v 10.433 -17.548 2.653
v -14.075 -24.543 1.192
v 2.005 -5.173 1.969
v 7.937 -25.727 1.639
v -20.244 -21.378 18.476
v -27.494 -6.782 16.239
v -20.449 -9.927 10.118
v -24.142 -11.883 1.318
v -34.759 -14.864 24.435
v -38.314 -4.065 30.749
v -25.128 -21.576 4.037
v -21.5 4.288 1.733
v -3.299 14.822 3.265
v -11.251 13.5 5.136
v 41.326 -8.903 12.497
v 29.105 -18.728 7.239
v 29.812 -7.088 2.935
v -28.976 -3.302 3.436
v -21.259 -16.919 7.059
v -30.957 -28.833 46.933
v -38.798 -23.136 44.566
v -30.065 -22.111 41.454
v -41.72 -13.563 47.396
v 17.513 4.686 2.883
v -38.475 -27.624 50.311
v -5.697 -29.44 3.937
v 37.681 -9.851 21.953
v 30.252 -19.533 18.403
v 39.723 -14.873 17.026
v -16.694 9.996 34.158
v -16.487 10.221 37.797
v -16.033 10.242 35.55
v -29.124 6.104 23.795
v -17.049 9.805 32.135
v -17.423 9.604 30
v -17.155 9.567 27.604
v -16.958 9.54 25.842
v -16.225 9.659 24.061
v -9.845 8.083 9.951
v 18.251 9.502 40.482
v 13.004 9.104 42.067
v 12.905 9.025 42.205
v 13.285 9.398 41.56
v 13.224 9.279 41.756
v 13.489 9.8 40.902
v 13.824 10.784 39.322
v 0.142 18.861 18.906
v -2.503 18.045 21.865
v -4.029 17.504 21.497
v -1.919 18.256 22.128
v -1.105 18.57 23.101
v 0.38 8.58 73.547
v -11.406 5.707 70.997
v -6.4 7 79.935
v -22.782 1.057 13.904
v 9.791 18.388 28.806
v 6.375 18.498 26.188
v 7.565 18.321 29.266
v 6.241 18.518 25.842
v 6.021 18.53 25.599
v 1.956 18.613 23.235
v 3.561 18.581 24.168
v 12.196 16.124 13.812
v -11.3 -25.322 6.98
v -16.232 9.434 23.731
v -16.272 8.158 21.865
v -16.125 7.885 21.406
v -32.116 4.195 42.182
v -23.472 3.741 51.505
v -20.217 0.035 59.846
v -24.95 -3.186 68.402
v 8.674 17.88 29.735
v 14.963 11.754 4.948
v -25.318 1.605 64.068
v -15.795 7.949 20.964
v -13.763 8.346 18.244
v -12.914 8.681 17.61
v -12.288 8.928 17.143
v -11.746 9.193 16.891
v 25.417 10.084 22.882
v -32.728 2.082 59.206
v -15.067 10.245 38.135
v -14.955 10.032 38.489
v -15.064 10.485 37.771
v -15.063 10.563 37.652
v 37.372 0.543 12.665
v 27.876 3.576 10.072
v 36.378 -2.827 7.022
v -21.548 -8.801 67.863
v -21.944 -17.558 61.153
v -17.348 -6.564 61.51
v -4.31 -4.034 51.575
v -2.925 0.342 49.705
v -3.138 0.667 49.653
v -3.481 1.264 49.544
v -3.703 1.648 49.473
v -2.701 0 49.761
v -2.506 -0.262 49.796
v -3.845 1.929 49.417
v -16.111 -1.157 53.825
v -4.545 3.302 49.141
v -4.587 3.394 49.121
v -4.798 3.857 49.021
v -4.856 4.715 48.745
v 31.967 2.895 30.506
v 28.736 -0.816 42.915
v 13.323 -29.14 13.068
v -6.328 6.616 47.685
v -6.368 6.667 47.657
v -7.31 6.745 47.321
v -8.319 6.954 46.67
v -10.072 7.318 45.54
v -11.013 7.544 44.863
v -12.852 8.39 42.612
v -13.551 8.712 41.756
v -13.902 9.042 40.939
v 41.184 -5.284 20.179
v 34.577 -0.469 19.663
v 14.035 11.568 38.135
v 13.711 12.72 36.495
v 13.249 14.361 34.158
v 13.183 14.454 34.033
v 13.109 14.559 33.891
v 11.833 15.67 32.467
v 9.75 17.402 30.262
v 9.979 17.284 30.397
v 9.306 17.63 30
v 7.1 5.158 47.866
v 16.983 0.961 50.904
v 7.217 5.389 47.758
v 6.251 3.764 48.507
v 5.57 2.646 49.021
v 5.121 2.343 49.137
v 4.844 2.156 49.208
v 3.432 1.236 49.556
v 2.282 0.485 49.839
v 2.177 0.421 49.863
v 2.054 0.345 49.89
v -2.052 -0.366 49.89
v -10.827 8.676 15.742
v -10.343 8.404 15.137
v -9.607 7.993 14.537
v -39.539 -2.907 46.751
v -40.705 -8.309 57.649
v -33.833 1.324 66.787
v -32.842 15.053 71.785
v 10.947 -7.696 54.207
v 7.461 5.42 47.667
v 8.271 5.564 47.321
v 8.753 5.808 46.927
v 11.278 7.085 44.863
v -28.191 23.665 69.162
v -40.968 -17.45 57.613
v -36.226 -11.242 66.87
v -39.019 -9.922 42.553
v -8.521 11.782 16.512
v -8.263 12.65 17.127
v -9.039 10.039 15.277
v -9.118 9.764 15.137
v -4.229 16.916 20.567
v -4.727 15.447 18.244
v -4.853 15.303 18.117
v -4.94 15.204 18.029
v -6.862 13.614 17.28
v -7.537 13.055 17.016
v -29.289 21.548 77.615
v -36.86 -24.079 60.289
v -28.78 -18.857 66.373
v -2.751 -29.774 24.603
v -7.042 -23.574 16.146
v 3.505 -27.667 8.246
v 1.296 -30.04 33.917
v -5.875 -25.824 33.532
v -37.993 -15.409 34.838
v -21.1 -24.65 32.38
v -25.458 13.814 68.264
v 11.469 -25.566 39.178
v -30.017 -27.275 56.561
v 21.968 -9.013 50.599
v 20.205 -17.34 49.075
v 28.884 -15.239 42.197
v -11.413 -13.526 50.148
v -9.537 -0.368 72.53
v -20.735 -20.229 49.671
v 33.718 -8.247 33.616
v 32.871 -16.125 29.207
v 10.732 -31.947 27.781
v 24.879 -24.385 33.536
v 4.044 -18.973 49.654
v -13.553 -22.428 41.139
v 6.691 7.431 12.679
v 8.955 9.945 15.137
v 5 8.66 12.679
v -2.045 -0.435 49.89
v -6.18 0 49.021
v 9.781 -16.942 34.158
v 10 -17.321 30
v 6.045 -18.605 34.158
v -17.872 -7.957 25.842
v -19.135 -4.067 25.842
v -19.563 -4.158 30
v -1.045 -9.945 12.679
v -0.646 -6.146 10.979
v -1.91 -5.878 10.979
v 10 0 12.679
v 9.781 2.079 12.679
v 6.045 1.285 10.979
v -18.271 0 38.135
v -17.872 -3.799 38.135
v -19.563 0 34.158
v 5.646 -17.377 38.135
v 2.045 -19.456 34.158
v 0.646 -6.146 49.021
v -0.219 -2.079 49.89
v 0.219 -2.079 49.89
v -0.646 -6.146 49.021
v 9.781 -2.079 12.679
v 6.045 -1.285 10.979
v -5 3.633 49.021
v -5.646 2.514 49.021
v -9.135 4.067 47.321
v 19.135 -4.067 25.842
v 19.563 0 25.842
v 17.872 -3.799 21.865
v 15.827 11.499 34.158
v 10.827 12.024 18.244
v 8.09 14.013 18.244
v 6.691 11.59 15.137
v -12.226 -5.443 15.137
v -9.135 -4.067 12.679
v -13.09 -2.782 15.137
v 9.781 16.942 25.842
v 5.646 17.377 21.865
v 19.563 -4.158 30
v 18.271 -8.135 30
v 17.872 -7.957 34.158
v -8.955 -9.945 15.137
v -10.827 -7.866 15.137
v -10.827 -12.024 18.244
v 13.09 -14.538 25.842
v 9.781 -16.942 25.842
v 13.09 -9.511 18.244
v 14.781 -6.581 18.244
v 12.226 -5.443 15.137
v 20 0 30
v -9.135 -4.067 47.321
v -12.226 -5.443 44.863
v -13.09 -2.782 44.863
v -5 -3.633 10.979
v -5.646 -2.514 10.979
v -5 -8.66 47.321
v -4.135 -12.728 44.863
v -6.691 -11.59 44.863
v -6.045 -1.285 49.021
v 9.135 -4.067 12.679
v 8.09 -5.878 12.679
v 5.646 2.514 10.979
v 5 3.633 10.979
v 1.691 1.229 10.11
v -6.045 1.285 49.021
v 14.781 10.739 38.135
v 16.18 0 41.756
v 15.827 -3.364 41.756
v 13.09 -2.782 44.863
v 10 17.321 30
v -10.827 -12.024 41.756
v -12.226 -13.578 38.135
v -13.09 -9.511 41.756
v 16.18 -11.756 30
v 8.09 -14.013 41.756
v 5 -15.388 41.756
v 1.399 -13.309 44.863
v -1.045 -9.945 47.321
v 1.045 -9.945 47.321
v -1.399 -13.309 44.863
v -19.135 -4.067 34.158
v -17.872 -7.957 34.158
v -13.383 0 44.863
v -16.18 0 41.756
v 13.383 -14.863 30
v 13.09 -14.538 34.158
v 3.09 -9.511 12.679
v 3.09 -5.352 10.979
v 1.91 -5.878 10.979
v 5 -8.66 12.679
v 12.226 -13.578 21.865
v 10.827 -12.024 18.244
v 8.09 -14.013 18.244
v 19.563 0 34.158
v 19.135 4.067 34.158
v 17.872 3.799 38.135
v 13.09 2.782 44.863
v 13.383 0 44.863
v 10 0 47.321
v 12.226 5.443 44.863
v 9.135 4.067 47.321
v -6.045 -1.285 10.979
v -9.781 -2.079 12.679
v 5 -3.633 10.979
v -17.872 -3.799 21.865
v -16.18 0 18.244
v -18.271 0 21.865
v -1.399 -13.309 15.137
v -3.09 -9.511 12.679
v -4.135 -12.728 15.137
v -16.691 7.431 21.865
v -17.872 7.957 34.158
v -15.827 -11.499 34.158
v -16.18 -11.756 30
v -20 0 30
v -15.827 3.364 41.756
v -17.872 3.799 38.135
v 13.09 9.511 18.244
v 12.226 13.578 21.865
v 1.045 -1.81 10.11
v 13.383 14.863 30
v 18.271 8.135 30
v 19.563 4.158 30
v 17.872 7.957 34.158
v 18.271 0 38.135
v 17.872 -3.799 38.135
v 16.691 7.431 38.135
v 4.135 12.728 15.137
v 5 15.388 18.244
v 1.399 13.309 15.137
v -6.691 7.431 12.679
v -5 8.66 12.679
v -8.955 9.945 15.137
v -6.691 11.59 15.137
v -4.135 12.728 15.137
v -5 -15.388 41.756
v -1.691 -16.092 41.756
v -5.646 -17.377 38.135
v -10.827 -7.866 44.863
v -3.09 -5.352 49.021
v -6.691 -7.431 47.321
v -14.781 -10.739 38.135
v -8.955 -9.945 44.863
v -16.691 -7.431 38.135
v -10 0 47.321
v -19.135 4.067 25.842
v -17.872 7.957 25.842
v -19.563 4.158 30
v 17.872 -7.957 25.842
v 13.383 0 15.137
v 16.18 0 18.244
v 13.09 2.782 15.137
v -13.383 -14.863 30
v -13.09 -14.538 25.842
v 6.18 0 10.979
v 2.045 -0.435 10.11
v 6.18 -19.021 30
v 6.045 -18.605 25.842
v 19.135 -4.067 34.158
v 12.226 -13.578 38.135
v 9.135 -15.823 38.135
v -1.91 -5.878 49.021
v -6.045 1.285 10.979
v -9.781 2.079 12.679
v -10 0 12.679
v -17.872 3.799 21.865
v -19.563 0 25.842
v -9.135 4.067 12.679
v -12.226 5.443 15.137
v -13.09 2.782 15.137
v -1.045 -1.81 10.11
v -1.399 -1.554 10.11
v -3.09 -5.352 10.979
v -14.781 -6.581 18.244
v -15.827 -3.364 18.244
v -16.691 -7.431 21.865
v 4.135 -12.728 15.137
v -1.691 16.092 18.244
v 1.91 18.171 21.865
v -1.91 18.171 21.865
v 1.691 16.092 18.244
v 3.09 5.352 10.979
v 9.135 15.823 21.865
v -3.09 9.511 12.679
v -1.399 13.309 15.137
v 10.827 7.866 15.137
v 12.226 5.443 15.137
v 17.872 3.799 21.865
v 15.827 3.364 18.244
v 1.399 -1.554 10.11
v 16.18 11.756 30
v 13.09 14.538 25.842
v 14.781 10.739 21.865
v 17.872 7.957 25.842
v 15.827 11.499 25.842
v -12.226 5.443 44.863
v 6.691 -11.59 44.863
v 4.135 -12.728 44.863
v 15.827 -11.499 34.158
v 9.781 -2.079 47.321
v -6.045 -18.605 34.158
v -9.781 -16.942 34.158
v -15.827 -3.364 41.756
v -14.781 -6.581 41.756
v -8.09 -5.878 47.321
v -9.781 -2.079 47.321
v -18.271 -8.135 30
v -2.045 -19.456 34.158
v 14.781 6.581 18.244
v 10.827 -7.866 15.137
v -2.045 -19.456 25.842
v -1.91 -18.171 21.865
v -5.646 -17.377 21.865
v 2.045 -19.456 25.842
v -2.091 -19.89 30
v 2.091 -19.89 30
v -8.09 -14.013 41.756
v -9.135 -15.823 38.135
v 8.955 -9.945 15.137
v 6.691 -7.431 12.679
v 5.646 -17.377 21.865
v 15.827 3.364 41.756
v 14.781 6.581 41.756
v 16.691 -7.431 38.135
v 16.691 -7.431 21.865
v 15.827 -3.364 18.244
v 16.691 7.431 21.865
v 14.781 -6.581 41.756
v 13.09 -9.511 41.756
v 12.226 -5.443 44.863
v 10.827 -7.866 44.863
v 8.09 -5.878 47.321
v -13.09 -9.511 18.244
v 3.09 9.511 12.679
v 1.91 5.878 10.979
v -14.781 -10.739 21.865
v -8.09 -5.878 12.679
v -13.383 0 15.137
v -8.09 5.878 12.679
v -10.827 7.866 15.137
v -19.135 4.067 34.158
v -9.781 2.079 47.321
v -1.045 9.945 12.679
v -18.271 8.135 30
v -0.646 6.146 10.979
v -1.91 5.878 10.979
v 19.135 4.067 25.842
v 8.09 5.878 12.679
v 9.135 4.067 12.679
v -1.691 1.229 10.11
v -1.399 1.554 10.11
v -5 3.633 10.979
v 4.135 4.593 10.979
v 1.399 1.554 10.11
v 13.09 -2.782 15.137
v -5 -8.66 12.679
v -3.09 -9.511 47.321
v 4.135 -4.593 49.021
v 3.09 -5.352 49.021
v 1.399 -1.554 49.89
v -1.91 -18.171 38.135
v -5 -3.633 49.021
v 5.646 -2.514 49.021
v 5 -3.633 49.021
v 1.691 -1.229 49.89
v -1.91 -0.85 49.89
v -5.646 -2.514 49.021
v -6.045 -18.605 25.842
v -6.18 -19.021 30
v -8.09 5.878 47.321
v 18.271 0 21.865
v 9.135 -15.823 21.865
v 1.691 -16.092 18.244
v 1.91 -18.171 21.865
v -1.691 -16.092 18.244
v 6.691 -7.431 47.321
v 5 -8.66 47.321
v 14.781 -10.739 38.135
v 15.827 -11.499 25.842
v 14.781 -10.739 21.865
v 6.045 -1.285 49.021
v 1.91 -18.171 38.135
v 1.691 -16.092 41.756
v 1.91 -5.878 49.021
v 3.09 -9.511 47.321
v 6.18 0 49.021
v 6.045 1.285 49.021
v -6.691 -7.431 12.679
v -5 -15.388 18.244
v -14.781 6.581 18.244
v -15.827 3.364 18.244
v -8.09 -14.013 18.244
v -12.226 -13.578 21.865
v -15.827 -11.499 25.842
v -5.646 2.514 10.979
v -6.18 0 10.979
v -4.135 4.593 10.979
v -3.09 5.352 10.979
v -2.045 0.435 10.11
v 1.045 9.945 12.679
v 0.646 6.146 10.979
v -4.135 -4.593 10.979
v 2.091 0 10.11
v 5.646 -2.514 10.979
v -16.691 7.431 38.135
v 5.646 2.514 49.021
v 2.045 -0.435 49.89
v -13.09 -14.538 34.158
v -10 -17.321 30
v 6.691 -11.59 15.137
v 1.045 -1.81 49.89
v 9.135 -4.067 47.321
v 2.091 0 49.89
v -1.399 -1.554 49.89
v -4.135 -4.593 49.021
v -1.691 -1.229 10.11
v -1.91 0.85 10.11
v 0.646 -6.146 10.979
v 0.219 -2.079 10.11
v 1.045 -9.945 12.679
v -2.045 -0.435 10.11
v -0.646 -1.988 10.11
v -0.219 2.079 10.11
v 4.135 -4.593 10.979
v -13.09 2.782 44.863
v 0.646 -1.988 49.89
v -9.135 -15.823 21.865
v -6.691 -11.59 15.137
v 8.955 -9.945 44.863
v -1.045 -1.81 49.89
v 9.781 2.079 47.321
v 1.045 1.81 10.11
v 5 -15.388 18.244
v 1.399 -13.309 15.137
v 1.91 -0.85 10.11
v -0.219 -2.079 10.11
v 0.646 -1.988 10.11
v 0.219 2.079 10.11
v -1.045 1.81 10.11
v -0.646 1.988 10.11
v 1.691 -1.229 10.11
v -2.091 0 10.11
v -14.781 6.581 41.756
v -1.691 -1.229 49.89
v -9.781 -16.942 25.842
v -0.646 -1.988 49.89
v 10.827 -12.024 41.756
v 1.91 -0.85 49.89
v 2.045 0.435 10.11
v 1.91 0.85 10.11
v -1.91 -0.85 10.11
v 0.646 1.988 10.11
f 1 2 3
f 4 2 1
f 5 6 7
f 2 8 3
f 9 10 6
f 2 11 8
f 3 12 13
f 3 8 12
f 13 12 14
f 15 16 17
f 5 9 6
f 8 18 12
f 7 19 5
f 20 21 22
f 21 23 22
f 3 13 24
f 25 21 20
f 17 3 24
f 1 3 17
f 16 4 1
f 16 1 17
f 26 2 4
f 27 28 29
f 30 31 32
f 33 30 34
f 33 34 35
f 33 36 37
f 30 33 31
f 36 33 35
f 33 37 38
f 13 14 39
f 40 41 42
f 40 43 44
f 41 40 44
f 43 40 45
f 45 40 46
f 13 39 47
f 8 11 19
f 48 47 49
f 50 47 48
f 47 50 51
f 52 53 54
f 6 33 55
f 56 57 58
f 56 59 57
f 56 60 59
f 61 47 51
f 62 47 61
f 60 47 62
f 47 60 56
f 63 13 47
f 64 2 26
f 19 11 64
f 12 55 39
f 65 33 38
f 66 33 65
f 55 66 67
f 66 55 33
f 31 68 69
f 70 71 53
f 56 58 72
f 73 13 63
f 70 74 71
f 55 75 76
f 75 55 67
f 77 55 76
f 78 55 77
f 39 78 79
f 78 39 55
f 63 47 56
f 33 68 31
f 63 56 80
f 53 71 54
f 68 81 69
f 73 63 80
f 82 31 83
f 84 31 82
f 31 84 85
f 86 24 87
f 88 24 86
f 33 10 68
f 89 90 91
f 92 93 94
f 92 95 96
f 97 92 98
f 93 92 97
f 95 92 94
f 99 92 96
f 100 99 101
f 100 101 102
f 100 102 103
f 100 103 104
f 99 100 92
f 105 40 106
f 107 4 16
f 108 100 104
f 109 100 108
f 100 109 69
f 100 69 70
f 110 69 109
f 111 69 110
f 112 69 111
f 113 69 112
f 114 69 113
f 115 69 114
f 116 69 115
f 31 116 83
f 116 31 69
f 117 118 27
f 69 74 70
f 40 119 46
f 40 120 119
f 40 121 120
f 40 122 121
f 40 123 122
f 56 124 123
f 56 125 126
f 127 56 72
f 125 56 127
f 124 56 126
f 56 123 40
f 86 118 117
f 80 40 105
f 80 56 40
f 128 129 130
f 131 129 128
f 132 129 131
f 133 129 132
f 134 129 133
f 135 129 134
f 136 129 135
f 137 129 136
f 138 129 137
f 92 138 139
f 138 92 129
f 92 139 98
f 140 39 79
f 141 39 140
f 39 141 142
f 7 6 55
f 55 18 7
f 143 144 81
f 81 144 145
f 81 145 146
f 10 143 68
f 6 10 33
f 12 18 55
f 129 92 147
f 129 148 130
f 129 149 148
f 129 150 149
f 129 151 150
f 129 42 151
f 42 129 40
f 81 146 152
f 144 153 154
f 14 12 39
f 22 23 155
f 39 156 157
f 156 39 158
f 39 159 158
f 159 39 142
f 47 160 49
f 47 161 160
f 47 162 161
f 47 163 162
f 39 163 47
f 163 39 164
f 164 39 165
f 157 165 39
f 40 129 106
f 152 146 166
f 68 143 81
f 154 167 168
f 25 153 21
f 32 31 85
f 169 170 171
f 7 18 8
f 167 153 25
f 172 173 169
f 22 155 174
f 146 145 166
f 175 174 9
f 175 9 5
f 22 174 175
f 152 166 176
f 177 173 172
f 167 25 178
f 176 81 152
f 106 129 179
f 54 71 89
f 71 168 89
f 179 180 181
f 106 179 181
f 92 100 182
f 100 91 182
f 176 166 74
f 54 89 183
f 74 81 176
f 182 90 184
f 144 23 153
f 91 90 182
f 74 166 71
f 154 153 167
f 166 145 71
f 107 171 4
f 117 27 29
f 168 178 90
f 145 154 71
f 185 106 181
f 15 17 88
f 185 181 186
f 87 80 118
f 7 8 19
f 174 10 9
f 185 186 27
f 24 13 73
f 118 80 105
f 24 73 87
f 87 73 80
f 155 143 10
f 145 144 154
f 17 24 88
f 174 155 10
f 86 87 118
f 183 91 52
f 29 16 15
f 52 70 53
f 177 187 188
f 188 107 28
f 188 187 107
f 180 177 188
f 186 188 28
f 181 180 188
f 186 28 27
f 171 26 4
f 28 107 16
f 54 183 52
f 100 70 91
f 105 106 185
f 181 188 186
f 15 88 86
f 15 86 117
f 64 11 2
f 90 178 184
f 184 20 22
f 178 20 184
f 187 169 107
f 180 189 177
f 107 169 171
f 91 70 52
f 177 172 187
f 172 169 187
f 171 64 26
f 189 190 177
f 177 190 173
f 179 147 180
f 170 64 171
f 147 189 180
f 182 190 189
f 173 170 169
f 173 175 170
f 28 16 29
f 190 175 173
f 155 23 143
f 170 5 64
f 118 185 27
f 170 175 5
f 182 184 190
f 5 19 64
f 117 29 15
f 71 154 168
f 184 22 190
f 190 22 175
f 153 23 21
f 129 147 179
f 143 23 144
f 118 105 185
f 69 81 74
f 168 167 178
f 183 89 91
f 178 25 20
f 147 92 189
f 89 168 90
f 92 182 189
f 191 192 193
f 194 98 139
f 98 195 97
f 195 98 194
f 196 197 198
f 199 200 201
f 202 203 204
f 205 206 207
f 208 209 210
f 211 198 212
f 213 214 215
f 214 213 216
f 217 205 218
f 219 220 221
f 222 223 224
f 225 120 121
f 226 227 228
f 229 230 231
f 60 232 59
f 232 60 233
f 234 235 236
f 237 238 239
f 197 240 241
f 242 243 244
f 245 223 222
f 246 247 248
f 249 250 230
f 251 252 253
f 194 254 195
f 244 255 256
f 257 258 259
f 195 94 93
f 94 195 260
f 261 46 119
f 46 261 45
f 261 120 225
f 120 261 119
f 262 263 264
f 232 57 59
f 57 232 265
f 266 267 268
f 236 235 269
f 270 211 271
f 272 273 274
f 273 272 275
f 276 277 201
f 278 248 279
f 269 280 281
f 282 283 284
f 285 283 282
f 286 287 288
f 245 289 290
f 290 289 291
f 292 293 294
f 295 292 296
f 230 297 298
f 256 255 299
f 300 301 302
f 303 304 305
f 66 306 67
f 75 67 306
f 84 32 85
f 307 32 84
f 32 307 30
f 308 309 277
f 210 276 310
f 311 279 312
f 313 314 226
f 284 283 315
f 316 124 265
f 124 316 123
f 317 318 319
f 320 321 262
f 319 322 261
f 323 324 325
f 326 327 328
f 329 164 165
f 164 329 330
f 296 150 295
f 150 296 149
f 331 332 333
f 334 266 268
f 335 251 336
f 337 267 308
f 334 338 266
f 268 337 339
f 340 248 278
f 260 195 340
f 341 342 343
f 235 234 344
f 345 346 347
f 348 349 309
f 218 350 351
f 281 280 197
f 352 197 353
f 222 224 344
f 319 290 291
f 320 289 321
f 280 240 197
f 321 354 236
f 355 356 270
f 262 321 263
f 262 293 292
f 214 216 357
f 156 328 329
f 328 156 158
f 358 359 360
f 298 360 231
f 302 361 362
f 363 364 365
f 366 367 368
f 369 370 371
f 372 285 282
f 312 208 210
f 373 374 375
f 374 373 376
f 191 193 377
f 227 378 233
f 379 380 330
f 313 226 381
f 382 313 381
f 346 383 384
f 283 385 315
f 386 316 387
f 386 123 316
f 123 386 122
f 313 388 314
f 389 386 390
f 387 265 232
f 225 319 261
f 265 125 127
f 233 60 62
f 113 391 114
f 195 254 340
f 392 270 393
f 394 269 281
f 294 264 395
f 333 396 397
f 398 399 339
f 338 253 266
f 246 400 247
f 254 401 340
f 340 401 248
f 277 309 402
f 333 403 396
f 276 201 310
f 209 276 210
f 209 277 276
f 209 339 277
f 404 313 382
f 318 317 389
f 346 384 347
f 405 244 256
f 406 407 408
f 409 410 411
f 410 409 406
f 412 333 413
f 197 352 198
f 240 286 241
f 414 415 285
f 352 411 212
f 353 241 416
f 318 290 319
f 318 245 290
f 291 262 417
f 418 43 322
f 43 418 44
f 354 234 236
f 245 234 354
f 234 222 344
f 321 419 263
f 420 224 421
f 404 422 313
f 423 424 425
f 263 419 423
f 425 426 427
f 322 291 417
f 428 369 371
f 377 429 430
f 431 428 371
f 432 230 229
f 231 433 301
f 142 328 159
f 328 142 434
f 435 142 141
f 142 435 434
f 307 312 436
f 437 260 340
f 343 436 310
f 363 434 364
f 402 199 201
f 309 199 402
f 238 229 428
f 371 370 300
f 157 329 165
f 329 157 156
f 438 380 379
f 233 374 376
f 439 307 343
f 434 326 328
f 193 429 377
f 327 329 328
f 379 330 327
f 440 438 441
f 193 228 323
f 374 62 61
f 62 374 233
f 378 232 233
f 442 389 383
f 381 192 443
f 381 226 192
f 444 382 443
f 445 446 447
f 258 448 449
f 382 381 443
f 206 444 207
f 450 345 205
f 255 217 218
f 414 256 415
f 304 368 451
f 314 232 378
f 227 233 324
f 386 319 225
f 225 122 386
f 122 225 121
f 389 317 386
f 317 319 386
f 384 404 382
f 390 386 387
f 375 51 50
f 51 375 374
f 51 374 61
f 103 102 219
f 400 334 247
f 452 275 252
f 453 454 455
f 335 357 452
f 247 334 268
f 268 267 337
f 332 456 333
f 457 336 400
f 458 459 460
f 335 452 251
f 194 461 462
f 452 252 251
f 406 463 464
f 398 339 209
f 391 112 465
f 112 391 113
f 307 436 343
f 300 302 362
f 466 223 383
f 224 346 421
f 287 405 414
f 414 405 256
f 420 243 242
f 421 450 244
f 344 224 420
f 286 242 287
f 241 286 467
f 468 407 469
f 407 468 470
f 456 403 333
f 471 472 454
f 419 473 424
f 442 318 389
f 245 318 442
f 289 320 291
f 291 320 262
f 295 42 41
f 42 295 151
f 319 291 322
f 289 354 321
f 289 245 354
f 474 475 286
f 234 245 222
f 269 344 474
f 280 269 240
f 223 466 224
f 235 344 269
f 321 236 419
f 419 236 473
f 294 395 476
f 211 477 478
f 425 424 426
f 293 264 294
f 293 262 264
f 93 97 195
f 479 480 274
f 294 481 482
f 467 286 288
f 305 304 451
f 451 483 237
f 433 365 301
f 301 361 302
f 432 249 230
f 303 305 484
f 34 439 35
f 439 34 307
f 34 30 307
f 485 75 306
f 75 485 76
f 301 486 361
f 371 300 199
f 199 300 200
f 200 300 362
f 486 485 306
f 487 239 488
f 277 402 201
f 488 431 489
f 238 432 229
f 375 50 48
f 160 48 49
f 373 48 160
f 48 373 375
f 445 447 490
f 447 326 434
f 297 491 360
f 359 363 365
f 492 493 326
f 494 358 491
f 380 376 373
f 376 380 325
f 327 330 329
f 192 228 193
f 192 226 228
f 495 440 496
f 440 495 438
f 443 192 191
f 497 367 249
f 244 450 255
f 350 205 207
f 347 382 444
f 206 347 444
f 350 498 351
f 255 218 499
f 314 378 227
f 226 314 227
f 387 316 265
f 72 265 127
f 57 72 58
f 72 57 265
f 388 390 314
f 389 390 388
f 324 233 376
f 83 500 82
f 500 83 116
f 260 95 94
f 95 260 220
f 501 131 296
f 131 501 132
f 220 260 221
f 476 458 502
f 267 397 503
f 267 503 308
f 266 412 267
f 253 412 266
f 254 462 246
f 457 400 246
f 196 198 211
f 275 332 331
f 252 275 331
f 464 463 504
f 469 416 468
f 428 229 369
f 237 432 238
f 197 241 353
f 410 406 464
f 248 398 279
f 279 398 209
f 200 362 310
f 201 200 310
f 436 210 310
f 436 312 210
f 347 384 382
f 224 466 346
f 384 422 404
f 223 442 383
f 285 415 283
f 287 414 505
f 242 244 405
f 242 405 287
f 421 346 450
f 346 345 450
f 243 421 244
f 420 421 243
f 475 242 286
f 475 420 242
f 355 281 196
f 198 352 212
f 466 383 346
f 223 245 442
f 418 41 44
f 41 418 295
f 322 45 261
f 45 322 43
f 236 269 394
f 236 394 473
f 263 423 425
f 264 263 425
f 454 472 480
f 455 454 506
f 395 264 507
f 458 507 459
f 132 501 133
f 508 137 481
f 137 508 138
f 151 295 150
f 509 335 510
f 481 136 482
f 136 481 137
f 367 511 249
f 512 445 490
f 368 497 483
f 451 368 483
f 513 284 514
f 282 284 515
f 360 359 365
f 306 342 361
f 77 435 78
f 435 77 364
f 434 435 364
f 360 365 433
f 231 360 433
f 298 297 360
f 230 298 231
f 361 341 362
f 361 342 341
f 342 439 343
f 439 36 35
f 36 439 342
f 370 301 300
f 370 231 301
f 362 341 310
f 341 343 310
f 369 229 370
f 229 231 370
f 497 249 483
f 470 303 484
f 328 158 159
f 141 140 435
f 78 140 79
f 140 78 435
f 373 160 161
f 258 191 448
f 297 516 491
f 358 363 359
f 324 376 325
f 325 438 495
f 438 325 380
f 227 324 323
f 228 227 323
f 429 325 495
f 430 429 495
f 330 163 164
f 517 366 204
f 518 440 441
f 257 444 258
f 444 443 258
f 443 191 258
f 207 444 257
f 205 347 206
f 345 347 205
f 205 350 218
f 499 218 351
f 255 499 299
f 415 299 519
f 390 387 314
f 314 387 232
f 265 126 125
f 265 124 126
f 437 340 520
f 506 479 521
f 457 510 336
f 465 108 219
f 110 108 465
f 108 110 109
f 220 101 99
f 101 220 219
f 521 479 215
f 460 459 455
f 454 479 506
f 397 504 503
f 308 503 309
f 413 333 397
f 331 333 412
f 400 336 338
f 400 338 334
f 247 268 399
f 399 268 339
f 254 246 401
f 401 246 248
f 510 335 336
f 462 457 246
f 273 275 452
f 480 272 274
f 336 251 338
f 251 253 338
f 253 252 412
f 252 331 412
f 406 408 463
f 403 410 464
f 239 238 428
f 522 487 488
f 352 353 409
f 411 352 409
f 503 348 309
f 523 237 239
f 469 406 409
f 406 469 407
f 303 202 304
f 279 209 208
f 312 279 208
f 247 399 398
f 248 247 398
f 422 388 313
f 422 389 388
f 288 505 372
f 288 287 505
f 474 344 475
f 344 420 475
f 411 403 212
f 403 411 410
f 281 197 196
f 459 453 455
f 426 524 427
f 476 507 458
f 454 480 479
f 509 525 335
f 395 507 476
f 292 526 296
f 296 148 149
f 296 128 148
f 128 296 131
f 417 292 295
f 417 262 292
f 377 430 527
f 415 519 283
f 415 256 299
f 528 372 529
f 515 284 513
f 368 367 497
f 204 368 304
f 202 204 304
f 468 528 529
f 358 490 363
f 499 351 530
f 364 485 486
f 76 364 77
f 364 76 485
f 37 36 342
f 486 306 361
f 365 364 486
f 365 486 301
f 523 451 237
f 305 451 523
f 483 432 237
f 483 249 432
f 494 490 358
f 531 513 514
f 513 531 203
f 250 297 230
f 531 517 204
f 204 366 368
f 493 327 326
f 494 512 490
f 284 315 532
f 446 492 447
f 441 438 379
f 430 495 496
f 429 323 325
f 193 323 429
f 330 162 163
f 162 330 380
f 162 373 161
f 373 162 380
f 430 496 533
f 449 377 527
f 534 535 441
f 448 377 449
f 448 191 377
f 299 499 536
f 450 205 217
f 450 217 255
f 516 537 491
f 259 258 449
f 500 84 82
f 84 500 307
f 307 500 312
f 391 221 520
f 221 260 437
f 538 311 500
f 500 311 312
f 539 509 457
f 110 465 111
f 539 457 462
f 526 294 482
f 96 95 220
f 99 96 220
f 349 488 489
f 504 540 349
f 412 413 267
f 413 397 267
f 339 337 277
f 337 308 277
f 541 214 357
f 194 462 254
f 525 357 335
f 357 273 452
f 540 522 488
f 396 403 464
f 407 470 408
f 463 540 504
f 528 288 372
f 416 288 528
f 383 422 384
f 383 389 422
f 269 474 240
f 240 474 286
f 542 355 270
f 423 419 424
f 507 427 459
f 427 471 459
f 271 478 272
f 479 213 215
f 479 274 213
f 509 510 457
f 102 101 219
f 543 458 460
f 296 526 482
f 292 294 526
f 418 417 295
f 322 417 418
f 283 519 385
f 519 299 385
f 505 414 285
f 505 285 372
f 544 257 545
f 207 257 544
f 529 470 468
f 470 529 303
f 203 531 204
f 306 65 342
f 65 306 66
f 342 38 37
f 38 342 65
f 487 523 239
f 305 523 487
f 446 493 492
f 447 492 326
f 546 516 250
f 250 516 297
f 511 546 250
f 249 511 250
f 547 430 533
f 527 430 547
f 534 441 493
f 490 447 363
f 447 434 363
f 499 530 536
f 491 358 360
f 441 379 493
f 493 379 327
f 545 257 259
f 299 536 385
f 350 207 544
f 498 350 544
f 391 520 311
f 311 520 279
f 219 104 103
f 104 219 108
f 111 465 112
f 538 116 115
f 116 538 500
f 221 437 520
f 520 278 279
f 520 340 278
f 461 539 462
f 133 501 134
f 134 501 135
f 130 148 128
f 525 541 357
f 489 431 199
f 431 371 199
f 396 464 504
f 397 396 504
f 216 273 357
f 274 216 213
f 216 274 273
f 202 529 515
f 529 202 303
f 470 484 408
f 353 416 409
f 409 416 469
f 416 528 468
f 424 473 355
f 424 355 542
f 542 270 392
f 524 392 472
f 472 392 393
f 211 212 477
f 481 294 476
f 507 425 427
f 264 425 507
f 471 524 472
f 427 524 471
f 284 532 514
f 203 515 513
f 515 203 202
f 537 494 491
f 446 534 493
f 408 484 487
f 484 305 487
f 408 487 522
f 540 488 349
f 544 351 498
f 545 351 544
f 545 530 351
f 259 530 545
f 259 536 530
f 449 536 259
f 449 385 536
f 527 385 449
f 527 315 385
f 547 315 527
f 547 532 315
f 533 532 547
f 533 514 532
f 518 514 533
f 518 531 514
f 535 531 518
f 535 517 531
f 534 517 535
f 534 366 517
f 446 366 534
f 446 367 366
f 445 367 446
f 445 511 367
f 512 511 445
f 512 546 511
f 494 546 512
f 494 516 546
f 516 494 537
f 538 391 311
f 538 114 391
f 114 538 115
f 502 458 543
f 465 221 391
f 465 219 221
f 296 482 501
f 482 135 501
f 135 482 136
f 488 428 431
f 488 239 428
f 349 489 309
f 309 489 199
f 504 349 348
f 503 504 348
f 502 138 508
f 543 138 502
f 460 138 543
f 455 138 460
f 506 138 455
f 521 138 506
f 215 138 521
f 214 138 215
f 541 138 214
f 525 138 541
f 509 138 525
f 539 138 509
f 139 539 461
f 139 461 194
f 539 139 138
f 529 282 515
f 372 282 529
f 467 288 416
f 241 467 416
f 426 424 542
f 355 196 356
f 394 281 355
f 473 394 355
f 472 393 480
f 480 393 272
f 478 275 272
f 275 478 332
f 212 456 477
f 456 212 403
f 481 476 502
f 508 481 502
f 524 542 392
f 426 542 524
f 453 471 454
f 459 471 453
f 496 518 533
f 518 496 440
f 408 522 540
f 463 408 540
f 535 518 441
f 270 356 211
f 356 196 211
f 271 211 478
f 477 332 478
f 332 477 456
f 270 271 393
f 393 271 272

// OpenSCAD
points=[
 [-1, 1,-1],[ 1, 1,-1],[ 1,-1,-1],[-1,-1,-1]
,[-1, 1, 1],[ 1, 1, 1],[ 1,-1, 1],[-1,-1, 1]
,[ 1,-1, 1],[ 1, 1, 1],[ 1, 1,-1],[ 1,-1,-1]
,[-1,-1, 1],[-1, 1, 1],[-1, 1,-1],[-1,-1,-1]
,[-1, 1,-1],[ 1, 1,-1],[ 1, 1, 1],[-1, 1, 1]
,[-1, -1,-1],[ 1, -1,-1],[ 1, -1, 1],[-1, -1, 1] 

];
faces=[
[3,2,1,0]
,[4,5,6,7]
,[8,9,10,11]
,[15,14,13,12]
,[16,17,18,19]
,[23,22,21,20]
];
b=bunny();
//polyhedron(points,faces);
t=glue(b[0],b[1]);
difference(){
polyhedron(t[0],t[1]);

translate([0,0,30])sphere(20);
}

echo(len(b[0]),len(t[0]));


function glue(points,faces)=let( 
upoints=unique(points),nfaces= 
[for(i=faces)[for(j=i)search([points[j]],upoints,1)[0]]])
[upoints,nfaces];
function  unique(m) = [   for (i = [0: len(m) - 1])    if (search([m[i]],m,1)==[i]) m[i] ];


function bunny()=[[[33.718,-8.247,33.616],[-30.065,-22.111,41.454],[1.142,14.457,35.998],[20.205,-17.34,49.075],[36.378,-2.827,7.022],[-11.251,13.5,5.136],[29.105,-18.728,7.239],[-9.845,8.083,9.951],[-36.86,-24.079,60.289],[-28.976,-3.302,3.436],[-11.413,-13.526,50.148],[28.736,-0.816,42.915],[-32.116,4.195,42.182],[29.812,-7.088,2.935],[-37.993,-15.409,34.838],[-28.78,-18.857,66.373],[-29.289,21.548,77.615],[-28.191,23.665,69.162],[-36.226,-11.242,66.87],[31.967,2.895,30.506],[-25.318,1.605,64.068],[-41.72,-13.563,47.396],[3.505,-27.667,8.246],[18.251,9.502,40.482],[-40.705,-8.309,57.649],[-34.759,-14.864,24.435],[41.326,-8.903,12.497],[7.937,-25.727,1.639],[0.142,18.861,18.906],[37.372,0.543,12.665],[11.469,-25.566,39.178],[-11.3,-25.322,6.98],[16.983,0.961,50.904],[25.417,10.084,22.882],[12.196,16.124,13.812],[-38.798,-23.136,44.566],[-6.906,16.568,23.283],[-11.406,5.707,70.997],[27.876,3.576,10.072],[-29.124,6.104,23.795],[30.252,-19.533,18.403],[-24.95,-3.186,68.402],[-21.5,4.288,1.733],[-20.217,0.035,59.846],[-16.111,-1.157,53.825],[9.791,18.388,28.806],[-20.449,-9.927,10.118],[-5.697,-29.44,3.937],[-14.075,-24.543,1.192],[-38.314,-4.065,30.749],[-17.348,-6.564,61.51],[39.723,-14.873,17.026],[-24.142,-11.883,1.318],[4.044,-18.973,49.654],[-25.128,-21.576,4.037],[28.884,-15.239,42.197],[-7.042,-23.574,16.146],[-22.782,1.057,13.904],[-30.957,-28.833,46.933],[-13.723,10.348,24.112],[-6.4,7,79.935],[0.38,8.58,73.547],[-2.751,-29.774,24.603],[32.871,-16.125,29.207],[-3.623,17.983,31.576],[17.513,4.686,2.883],[-30.017,-27.275,56.561],[13.323,-29.14,13.068],[-20.244,-21.378,18.476],[-20.735,-20.229,49.671],[34.577,-0.469,19.663],[-32.728,2.082,59.206],[1.448,8.004,45.899],[-21.1,-24.65,32.38],[-3.299,14.822,3.265],[37.681,-9.851,21.953],[10.732,-31.947,27.781],[-25.458,13.814,68.264],[14.963,11.754,4.948],[-21.548,-8.801,67.863],[2.005,-5.173,1.969],[-23.472,3.741,51.505],[21.968,-9.013,50.599],[-9.451,7.934,17.546],[41.184,-5.284,20.179],[-39.539,-2.907,46.751],[-39.019,-9.922,42.553],[-16.487,10.221,37.797],[-9.537,-0.368,72.53],[-13.553,-22.428,41.139],[-5.875,-25.824,33.532],[10.433,-17.548,2.653],[-40.968,-17.45,57.613],[-32.842,15.053,71.785],[-4.31,-4.034,51.575],[10.947,-7.696,54.207],[1.296,-30.04,33.917],[-33.833,1.324,66.787],[-27.494,-6.782,16.239],[-21.944,-17.558,61.153],[-38.475,-27.624,50.311],[24.879,-24.385,33.536],[-21.259,-16.919,7.059],[-21.259,-16.919,7.059],[-21.259,-16.919,7.059]],[[80,91,48],[27,48,91],[68,98,46],[48,52,80],[98,25,49],[54,52,48],[42,74,80],[52,42,80],[42,5,74],[6,13,26],[25,98,68],[9,42,52],[46,103,68],[58,35,1],[1,35,21],[80,74,65],[100,35,58],[80,65,13],[91,80,13],[27,91,6],[6,91,13],[47,48,27],[51,75,40],[87,59,39],[5,7,74],[2,72,23],[28,74,7],[54,104,52],[64,28,36],[60,61,37],[39,57,98],[64,45,28],[34,74,28],[31,48,47],[102,54,31],[7,42,57],[59,57,39],[12,81,87],[37,43,41],[2,45,64],[74,34,78],[41,43,20],[59,7,57],[28,45,34],[87,39,12],[45,33,34],[37,41,60],[12,71,81],[34,33,78],[72,2,87],[38,29,65],[65,29,4],[49,12,39],[50,79,99],[94,72,44],[23,11,19],[27,6,67],[72,81,44],[44,81,43],[87,81,72],[70,75,84],[43,81,20],[45,2,23],[29,70,84],[19,33,23],[33,45,23],[32,72,94],[83,7,59],[98,57,46],[57,9,46],[71,85,24],[97,71,24],[97,93,71],[85,12,49],[49,39,98],[9,57,42],[32,94,95],[23,72,32],[71,93,17],[18,24,92],[5,42,7],[86,1,21],[83,59,36],[83,36,7],[36,28,7],[64,36,59],[23,32,11],[93,16,17],[12,85,71],[18,8,15],[92,35,100],[87,2,59],[22,62,56],[9,52,46],[8,92,100],[90,62,96],[14,1,86],[93,97,16],[14,25,73],[25,68,73],[1,14,73],[16,77,17],[30,90,96],[2,64,59],[8,100,66],[77,71,17],[32,82,11],[41,79,60],[15,79,41],[3,55,82],[82,55,11],[10,94,44],[44,50,10],[20,77,16],[79,88,60],[20,71,77],[99,69,10],[21,92,24],[50,99,10],[16,41,20],[8,18,92],[97,41,16],[22,27,67],[51,84,75],[15,66,99],[97,18,41],[55,0,11],[4,26,13],[55,63,0],[70,38,33],[102,46,52],[14,49,25],[75,0,63],[74,78,65],[19,70,33],[38,65,78],[33,38,78],[86,85,49],[97,24,18],[65,4,13],[86,49,14],[70,29,38],[50,61,88],[6,26,51],[37,61,43],[30,76,101],[40,101,67],[101,76,67],[30,101,3],[101,40,63],[55,3,101],[40,75,63],[22,47,27],[67,6,40],[60,88,61],[43,50,44],[19,11,0],[63,55,101],[26,4,29],[84,26,29],[31,54,48],[69,99,66],[58,1,69],[69,66,58],[76,62,67],[3,53,30],[67,62,22],[43,61,50],[30,96,76],[96,62,76],[22,31,47],[53,89,30],[89,90,30],[95,3,82],[56,31,22],[95,53,3],[10,89,53],[90,56,62],[90,73,56],[40,6,51],[89,73,90],[21,85,86],[56,68,31],[0,75,70],[73,68,56],[69,89,10],[68,102,31],[84,51,26],[15,41,18],[89,69,1],[1,73,89],[92,21,35],[82,32,95],[24,85,21],[0,70,19],[71,20,81],[8,66,15],[79,50,88],[66,100,58],[94,53,95],[15,99,79],[10,53,94]]];
